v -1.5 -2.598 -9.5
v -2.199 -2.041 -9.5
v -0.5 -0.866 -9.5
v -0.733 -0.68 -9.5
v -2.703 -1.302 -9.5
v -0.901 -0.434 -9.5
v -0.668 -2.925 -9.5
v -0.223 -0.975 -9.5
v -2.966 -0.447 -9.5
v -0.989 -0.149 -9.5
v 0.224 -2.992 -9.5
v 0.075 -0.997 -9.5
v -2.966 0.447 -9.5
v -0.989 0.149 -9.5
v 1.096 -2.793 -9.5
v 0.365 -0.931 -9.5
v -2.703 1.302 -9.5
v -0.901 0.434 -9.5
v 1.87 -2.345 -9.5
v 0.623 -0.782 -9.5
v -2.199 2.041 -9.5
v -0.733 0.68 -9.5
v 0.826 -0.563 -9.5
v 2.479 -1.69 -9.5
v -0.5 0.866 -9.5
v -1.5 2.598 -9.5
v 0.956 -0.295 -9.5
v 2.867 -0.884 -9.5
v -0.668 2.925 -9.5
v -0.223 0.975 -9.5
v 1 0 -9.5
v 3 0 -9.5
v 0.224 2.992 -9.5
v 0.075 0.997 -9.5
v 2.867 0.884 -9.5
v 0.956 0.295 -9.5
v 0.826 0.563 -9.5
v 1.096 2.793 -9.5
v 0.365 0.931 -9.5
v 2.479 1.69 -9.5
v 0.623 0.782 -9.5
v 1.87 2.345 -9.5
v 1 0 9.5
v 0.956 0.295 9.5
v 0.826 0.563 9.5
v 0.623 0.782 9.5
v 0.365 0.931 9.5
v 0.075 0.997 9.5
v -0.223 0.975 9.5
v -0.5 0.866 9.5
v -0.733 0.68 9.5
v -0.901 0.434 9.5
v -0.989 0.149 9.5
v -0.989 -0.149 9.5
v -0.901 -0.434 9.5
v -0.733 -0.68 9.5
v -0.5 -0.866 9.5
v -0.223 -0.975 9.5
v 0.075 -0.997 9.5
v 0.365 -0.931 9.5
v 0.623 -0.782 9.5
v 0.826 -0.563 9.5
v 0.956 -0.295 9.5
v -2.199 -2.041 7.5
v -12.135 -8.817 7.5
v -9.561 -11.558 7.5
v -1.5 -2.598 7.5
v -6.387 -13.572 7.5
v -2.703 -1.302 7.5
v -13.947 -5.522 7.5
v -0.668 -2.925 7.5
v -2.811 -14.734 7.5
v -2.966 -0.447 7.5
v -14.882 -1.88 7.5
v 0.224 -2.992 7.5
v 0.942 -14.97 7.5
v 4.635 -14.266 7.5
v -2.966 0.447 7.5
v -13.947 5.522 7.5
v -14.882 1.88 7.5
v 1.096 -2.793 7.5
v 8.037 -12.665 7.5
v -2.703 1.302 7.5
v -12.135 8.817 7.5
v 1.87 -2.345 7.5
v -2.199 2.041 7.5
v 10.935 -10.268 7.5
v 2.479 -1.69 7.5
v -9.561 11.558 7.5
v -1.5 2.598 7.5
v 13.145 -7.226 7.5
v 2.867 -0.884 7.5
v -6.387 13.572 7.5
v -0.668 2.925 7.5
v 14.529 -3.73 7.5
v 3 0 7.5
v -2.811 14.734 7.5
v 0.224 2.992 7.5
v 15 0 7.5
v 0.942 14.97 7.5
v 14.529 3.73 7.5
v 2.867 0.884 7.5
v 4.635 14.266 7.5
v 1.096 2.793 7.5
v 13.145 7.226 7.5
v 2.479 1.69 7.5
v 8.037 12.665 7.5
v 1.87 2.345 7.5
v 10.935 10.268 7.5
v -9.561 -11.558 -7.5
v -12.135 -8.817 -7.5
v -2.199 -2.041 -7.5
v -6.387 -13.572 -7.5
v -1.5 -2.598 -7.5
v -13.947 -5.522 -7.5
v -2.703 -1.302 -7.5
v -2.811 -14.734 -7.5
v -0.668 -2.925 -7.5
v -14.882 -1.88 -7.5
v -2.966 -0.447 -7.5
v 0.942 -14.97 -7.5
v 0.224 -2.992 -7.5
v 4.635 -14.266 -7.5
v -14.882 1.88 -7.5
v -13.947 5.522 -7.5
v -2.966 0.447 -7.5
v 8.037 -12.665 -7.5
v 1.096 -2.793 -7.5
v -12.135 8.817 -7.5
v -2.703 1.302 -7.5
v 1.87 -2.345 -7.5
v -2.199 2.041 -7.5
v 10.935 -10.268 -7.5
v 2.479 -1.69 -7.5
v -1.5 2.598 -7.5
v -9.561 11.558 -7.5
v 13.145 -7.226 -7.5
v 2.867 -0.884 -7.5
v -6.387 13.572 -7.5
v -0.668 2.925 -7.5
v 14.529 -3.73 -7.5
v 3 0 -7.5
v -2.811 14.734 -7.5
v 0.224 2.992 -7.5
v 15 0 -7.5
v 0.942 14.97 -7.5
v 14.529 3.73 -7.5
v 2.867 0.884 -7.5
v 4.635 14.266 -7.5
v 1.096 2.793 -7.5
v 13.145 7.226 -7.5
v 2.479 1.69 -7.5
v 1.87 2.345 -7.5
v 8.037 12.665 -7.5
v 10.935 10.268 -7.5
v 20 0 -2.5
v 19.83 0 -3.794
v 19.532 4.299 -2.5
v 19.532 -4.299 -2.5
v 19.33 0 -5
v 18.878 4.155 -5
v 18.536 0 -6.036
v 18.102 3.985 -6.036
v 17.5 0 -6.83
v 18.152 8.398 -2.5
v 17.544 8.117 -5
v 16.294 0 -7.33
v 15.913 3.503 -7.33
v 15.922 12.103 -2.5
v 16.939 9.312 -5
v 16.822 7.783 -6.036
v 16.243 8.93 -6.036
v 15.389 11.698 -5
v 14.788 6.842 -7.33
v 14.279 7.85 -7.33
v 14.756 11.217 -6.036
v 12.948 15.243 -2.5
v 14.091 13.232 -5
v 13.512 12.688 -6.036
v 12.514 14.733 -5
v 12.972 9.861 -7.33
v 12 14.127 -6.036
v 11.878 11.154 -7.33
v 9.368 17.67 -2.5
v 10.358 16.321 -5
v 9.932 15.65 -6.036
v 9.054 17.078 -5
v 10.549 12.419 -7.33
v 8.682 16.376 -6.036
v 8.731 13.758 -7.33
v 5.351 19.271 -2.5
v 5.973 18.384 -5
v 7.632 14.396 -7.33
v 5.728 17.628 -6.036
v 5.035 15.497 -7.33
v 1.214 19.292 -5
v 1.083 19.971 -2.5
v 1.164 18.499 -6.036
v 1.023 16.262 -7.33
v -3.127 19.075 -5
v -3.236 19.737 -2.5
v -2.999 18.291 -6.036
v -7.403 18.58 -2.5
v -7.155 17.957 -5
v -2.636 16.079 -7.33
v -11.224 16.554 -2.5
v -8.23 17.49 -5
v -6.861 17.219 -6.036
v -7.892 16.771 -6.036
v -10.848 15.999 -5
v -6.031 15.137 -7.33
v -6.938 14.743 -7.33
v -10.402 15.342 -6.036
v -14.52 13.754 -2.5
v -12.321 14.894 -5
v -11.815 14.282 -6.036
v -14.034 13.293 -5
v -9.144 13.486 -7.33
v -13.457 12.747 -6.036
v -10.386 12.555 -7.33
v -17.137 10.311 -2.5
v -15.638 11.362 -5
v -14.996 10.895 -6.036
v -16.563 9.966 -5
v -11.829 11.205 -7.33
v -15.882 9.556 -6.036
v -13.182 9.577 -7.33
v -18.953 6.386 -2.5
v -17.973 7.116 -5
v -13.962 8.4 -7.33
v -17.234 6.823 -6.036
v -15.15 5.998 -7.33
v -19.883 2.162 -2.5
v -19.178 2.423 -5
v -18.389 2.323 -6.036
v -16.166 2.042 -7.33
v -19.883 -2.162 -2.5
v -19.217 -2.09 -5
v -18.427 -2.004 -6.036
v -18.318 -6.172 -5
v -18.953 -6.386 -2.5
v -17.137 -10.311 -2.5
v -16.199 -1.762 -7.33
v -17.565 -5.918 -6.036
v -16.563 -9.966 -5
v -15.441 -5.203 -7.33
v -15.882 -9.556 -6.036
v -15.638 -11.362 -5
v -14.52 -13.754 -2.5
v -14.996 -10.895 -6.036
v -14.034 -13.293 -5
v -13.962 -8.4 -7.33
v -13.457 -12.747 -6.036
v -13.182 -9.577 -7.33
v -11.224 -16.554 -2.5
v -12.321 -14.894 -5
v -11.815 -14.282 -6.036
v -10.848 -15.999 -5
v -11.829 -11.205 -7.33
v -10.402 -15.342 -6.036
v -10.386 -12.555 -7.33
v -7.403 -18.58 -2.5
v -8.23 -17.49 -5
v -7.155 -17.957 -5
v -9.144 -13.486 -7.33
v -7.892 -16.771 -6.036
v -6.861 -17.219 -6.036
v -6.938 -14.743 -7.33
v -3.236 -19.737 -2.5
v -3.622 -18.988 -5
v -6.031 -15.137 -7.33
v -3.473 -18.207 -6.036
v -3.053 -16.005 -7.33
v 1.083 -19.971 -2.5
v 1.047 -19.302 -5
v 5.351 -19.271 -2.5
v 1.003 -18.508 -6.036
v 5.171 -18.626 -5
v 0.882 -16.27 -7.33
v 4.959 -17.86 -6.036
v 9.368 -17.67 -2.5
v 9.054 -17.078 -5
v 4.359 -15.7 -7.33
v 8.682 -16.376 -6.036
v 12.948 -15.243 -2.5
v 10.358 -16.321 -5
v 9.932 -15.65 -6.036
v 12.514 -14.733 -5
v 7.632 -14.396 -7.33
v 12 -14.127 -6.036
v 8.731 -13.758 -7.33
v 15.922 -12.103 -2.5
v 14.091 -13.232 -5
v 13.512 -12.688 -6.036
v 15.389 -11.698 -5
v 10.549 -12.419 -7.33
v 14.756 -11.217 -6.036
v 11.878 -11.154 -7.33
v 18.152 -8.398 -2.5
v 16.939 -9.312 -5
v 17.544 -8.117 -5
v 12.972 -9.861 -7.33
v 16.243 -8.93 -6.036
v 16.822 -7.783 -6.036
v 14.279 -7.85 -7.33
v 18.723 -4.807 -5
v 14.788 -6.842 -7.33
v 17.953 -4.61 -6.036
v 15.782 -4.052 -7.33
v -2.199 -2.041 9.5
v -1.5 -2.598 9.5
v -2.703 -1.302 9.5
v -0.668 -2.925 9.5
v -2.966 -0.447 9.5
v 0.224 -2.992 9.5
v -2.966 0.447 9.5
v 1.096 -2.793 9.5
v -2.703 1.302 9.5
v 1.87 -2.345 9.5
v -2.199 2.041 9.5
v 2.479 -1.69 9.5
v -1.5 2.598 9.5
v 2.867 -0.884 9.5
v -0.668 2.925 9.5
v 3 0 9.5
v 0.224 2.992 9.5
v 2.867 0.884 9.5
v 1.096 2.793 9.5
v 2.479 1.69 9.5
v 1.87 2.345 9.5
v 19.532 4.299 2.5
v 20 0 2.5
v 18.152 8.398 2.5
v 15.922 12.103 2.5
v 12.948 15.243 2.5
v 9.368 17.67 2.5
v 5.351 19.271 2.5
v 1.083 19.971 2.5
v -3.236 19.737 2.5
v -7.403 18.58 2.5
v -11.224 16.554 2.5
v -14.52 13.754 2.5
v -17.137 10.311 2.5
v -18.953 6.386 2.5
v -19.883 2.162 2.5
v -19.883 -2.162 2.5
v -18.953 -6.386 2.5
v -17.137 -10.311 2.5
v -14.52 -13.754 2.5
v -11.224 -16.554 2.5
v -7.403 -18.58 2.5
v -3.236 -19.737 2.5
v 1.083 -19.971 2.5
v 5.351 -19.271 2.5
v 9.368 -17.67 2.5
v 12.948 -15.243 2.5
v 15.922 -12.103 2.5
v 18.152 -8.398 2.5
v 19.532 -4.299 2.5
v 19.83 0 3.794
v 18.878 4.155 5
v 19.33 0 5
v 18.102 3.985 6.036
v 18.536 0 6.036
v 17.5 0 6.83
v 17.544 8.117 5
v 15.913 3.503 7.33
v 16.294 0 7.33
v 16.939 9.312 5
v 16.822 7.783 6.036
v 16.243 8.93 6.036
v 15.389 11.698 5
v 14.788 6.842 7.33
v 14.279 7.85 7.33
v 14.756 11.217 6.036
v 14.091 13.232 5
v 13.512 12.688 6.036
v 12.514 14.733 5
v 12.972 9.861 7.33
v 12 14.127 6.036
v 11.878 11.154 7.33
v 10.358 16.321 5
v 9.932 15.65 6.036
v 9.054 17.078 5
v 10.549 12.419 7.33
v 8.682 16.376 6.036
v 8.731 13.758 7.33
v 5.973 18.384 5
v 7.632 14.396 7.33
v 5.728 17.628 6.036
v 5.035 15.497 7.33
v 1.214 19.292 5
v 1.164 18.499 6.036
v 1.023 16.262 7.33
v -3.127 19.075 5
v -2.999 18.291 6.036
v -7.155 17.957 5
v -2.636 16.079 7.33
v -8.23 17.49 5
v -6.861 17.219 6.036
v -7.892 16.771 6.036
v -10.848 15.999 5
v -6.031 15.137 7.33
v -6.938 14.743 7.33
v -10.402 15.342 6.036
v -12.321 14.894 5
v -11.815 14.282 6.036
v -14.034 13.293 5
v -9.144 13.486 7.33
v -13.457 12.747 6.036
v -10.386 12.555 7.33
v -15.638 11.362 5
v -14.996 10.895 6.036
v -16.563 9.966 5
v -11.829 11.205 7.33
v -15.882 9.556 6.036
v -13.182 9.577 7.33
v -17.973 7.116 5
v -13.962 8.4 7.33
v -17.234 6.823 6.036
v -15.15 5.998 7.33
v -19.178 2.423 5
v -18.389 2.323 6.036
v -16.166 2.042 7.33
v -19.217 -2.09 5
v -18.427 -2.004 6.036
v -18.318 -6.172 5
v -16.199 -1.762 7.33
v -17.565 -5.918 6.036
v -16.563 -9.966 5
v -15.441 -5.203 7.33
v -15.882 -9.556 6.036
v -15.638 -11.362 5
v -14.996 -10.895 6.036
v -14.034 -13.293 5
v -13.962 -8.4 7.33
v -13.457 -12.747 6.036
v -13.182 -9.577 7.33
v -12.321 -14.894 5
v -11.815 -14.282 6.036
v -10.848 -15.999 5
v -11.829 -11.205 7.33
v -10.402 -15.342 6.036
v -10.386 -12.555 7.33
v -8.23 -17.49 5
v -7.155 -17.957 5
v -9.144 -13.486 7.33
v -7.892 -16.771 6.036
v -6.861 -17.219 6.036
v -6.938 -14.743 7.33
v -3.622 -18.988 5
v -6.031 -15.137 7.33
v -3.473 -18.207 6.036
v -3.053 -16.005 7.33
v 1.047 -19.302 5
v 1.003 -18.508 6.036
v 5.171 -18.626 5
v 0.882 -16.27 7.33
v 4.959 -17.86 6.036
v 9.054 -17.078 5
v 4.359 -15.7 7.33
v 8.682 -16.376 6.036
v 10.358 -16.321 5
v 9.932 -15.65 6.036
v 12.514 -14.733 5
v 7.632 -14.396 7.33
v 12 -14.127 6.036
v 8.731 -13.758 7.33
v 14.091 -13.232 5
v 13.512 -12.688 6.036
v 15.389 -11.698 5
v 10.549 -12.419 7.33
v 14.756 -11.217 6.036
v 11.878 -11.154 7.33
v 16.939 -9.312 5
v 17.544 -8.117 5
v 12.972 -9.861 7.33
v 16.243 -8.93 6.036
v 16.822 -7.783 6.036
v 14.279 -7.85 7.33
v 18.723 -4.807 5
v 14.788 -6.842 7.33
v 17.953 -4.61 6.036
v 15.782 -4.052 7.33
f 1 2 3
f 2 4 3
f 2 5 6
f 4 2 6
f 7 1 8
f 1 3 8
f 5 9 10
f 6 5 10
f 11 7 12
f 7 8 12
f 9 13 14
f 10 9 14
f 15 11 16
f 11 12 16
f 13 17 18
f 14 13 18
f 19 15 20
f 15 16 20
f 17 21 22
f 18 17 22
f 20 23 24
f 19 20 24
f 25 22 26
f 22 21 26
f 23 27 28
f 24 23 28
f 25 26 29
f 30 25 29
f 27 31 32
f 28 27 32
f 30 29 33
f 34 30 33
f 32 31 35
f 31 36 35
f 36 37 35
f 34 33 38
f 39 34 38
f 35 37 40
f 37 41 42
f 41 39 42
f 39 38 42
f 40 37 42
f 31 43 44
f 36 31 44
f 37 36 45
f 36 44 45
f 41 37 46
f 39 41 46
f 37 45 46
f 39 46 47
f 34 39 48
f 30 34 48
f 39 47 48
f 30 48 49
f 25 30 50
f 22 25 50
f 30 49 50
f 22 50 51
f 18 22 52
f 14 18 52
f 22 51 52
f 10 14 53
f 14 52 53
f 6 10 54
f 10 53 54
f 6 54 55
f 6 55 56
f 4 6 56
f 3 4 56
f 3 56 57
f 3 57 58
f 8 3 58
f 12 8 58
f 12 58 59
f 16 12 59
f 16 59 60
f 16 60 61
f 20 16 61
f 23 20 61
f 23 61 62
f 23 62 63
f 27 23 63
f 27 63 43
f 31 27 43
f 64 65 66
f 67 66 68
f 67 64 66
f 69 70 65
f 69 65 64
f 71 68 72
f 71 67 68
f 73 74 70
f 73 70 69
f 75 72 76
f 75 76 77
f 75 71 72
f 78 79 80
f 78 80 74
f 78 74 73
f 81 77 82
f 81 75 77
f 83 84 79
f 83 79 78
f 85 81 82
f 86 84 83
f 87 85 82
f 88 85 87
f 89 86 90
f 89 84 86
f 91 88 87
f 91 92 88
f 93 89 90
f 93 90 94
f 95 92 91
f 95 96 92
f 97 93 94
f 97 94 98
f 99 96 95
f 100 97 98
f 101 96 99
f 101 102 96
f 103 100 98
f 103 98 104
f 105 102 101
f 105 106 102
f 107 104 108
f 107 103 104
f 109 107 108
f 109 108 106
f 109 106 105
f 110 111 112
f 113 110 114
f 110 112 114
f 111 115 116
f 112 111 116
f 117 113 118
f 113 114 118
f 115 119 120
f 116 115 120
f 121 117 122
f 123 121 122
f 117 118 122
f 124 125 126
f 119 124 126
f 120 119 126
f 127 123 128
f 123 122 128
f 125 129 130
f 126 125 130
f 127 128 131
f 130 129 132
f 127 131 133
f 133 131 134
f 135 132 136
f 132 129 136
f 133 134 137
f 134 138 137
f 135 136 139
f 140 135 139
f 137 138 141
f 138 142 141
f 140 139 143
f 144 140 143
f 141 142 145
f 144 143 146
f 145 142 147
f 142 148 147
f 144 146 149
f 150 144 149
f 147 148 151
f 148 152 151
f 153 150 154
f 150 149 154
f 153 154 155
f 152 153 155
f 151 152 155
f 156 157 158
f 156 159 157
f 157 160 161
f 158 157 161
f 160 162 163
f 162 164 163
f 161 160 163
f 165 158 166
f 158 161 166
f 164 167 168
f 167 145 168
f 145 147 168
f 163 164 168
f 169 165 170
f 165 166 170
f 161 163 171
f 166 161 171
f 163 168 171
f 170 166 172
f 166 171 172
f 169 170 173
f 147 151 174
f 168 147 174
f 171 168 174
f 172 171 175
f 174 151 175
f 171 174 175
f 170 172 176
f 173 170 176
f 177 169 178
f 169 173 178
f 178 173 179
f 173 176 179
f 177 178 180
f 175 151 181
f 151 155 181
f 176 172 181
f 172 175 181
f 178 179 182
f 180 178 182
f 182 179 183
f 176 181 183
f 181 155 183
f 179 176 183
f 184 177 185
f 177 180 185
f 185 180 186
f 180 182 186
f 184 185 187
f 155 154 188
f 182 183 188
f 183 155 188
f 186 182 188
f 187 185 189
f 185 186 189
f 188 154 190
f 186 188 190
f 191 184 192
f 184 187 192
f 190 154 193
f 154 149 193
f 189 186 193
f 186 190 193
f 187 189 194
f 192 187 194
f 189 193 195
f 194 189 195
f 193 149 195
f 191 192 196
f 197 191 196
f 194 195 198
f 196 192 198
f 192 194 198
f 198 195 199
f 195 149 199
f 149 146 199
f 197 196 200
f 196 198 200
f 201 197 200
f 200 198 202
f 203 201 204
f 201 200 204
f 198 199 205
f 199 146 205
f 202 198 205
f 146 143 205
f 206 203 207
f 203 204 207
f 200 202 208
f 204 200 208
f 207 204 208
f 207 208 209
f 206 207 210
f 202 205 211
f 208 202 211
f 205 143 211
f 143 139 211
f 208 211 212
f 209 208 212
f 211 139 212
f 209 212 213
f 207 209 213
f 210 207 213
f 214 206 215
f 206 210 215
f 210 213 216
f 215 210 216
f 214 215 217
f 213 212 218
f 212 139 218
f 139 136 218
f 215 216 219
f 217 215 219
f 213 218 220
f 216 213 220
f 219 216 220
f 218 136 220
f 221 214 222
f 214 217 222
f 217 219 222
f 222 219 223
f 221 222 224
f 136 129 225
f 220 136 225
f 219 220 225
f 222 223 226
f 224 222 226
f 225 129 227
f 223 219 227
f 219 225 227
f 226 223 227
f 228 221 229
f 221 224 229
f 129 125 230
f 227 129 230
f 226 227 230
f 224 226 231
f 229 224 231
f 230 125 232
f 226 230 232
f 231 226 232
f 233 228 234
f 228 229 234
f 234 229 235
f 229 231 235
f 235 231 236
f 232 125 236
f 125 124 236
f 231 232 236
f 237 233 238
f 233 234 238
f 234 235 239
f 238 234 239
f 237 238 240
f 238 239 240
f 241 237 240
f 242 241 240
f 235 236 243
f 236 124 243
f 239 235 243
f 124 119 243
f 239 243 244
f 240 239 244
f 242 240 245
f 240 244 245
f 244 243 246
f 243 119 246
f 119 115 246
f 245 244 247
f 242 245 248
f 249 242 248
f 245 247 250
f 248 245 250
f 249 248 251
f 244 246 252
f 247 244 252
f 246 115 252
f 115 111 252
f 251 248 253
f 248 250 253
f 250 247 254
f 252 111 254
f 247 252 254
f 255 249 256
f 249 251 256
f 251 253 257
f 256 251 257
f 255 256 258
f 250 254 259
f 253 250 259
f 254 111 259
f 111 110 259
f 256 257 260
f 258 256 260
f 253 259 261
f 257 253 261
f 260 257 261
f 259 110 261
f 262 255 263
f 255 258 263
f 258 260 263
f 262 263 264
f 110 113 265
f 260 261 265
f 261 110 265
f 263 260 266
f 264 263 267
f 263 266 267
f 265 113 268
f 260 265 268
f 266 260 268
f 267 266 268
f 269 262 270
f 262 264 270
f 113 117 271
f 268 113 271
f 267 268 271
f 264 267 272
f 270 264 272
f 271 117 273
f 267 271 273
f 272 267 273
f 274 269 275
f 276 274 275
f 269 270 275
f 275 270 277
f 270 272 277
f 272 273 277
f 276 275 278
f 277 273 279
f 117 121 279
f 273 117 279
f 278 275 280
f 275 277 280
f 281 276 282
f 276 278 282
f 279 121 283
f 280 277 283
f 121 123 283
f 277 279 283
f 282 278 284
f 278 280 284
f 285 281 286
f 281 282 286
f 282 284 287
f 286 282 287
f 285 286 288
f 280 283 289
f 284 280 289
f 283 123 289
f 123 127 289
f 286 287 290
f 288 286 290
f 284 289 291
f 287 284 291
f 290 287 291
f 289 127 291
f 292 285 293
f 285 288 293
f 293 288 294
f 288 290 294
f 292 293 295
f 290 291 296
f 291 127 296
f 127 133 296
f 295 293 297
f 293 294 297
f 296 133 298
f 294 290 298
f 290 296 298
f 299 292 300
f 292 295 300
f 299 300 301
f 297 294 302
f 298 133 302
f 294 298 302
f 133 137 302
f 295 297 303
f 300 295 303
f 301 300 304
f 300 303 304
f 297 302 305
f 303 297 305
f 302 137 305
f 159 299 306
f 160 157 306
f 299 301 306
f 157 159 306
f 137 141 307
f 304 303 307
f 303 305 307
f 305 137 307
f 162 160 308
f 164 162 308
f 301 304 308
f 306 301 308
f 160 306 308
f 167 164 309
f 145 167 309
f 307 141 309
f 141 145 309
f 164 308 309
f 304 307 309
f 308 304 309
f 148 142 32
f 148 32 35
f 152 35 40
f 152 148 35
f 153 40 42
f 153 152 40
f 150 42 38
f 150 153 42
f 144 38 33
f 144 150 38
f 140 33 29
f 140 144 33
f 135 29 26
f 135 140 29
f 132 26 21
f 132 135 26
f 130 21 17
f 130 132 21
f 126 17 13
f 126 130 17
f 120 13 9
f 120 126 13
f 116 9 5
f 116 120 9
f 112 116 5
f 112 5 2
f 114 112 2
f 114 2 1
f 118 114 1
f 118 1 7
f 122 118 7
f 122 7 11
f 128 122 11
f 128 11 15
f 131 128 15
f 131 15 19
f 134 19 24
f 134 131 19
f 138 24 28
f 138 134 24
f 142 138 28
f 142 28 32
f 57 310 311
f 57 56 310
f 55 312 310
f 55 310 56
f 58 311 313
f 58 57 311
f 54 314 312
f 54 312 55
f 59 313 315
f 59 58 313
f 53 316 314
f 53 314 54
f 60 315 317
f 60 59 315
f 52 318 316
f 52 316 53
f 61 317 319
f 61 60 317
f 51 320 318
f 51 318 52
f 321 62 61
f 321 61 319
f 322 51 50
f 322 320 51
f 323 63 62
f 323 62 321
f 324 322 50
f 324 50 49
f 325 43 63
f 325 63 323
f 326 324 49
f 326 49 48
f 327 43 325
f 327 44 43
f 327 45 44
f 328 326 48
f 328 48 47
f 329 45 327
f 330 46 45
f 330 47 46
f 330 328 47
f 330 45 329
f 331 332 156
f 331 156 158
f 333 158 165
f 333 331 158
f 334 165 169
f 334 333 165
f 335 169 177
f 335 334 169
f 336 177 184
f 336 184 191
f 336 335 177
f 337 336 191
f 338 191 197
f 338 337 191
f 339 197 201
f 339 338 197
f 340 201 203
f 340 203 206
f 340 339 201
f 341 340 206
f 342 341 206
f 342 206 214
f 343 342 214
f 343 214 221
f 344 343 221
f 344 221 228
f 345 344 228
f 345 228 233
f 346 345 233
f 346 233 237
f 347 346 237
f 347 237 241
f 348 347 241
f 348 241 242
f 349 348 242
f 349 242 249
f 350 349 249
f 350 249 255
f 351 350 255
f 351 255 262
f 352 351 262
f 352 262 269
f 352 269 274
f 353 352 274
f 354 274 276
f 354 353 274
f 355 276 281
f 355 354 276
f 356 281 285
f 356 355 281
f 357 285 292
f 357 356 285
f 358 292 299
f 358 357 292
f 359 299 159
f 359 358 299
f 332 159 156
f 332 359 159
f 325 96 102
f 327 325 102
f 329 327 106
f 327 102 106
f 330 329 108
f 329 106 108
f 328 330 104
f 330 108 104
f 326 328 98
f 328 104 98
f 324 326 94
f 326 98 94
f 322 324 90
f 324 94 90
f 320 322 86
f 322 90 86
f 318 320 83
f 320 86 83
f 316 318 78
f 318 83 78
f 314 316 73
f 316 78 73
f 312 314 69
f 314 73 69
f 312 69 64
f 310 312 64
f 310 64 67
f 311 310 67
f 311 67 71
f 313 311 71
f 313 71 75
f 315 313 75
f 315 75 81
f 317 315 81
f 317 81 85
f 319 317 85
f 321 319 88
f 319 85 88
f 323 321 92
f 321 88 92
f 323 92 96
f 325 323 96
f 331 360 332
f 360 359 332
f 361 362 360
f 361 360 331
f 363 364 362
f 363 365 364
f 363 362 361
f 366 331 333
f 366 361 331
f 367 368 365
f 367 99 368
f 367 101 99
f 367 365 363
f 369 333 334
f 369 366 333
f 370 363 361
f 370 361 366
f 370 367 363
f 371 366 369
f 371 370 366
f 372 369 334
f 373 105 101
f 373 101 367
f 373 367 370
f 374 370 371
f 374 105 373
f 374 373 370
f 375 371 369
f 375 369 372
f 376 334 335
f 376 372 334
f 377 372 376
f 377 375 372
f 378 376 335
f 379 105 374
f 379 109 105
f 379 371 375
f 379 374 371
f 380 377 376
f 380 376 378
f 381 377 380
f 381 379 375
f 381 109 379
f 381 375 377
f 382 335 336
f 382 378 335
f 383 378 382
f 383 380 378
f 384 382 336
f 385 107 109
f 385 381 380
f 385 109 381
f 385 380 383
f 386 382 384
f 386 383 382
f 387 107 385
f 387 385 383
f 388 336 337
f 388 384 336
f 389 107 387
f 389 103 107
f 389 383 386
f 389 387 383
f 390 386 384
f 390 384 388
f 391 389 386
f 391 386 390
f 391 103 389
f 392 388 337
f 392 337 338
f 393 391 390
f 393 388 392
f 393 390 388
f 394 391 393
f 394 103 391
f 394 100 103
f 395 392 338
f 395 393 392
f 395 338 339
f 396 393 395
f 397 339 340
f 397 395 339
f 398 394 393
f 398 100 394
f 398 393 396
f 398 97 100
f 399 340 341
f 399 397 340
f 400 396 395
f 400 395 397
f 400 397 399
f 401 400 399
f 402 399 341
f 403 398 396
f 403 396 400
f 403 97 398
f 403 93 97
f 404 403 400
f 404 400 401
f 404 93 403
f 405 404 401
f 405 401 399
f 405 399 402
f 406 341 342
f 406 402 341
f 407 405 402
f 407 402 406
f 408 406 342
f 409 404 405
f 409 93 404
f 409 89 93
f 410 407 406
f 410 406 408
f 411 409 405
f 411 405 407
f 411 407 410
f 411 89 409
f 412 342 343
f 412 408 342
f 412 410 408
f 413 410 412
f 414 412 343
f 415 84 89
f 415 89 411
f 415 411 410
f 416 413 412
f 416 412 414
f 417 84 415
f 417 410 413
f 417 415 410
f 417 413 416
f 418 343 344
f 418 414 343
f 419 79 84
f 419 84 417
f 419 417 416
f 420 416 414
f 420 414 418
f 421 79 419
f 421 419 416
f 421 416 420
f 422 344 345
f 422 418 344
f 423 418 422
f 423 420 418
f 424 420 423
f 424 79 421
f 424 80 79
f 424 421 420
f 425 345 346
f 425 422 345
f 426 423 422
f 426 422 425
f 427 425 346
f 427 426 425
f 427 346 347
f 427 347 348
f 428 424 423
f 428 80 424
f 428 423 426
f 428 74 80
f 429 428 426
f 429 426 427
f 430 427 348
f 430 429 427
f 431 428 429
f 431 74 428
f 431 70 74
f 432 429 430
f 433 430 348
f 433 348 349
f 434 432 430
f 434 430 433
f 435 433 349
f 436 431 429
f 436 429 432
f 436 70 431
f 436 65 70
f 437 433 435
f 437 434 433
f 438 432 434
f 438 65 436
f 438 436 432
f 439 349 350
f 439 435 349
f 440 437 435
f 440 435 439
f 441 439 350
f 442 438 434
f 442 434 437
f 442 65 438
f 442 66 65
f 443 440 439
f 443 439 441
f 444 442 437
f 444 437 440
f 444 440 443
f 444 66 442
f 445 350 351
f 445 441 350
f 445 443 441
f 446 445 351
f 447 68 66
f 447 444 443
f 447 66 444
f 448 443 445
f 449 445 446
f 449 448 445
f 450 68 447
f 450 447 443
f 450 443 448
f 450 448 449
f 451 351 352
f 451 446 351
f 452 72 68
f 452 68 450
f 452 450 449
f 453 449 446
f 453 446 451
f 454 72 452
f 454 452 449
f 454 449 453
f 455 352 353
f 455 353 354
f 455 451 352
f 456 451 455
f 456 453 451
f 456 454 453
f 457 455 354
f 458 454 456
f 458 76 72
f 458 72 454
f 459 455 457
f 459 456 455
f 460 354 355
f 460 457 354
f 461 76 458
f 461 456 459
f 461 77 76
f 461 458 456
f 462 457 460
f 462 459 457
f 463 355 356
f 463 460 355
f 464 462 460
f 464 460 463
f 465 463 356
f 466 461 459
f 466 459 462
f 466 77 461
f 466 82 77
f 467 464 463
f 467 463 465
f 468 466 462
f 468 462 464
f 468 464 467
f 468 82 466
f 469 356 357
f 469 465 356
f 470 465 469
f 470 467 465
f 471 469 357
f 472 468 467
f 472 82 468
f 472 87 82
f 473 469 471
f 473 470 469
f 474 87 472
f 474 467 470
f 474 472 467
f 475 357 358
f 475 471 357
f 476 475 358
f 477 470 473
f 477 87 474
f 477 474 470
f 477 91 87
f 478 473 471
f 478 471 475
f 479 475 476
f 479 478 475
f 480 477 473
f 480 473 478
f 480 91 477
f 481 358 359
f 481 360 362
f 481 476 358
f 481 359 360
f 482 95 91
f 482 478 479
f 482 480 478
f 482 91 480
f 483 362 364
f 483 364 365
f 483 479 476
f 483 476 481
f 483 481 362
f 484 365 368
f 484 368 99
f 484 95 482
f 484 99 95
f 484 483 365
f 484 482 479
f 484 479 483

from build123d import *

# Parameters (mm, degrees)
SKETCH1_R           = 20
BOSS_EXTRUDE1_DEPTH = 7.5
FILLET2_R           = 5
SKETCH2_R           = 3
BOSS_EXTRUDE2_DEPTH = 2
SKETCH3_R           = 1
CUT_EXTRUDE1_DEPTH  = 35.073450133


with BuildPart() as part:
    # Sketch1 → Boss-Extrude1 (new, symmetric)
    with BuildSketch(Plane.XY):
        Circle(SKETCH1_R)
    extrude(amount=BOSS_EXTRUDE1_DEPTH, both=True)

    # Fillet2
    fillet2_edges = [part.edges().sort_by_distance(p)[0] for p in [
        (-20, 0, -7.5),
        (-20, 0, 7.5),
    ]]
    fillet(fillet2_edges, radius=FILLET2_R)

    # Sketch2 → Boss-Extrude2 (add)
    with BuildSketch(Plane.XY.offset(7.5)):
        Circle(SKETCH2_R)
    boss_extrude2 = extrude(amount=BOSS_EXTRUDE2_DEPTH)

    # Mirror3: Boss-Extrude2 across plane
    add(boss_extrude2.mirror(Plane.XY))

    # Sketch3 → Cut-Extrude1 (cut, through all)
    with BuildSketch(Plane.XY.offset(9.5)):
        Circle(SKETCH3_R)
    extrude(amount=-CUT_EXTRUDE1_DEPTH, mode=Mode.SUBTRACT)


solid = part.part
